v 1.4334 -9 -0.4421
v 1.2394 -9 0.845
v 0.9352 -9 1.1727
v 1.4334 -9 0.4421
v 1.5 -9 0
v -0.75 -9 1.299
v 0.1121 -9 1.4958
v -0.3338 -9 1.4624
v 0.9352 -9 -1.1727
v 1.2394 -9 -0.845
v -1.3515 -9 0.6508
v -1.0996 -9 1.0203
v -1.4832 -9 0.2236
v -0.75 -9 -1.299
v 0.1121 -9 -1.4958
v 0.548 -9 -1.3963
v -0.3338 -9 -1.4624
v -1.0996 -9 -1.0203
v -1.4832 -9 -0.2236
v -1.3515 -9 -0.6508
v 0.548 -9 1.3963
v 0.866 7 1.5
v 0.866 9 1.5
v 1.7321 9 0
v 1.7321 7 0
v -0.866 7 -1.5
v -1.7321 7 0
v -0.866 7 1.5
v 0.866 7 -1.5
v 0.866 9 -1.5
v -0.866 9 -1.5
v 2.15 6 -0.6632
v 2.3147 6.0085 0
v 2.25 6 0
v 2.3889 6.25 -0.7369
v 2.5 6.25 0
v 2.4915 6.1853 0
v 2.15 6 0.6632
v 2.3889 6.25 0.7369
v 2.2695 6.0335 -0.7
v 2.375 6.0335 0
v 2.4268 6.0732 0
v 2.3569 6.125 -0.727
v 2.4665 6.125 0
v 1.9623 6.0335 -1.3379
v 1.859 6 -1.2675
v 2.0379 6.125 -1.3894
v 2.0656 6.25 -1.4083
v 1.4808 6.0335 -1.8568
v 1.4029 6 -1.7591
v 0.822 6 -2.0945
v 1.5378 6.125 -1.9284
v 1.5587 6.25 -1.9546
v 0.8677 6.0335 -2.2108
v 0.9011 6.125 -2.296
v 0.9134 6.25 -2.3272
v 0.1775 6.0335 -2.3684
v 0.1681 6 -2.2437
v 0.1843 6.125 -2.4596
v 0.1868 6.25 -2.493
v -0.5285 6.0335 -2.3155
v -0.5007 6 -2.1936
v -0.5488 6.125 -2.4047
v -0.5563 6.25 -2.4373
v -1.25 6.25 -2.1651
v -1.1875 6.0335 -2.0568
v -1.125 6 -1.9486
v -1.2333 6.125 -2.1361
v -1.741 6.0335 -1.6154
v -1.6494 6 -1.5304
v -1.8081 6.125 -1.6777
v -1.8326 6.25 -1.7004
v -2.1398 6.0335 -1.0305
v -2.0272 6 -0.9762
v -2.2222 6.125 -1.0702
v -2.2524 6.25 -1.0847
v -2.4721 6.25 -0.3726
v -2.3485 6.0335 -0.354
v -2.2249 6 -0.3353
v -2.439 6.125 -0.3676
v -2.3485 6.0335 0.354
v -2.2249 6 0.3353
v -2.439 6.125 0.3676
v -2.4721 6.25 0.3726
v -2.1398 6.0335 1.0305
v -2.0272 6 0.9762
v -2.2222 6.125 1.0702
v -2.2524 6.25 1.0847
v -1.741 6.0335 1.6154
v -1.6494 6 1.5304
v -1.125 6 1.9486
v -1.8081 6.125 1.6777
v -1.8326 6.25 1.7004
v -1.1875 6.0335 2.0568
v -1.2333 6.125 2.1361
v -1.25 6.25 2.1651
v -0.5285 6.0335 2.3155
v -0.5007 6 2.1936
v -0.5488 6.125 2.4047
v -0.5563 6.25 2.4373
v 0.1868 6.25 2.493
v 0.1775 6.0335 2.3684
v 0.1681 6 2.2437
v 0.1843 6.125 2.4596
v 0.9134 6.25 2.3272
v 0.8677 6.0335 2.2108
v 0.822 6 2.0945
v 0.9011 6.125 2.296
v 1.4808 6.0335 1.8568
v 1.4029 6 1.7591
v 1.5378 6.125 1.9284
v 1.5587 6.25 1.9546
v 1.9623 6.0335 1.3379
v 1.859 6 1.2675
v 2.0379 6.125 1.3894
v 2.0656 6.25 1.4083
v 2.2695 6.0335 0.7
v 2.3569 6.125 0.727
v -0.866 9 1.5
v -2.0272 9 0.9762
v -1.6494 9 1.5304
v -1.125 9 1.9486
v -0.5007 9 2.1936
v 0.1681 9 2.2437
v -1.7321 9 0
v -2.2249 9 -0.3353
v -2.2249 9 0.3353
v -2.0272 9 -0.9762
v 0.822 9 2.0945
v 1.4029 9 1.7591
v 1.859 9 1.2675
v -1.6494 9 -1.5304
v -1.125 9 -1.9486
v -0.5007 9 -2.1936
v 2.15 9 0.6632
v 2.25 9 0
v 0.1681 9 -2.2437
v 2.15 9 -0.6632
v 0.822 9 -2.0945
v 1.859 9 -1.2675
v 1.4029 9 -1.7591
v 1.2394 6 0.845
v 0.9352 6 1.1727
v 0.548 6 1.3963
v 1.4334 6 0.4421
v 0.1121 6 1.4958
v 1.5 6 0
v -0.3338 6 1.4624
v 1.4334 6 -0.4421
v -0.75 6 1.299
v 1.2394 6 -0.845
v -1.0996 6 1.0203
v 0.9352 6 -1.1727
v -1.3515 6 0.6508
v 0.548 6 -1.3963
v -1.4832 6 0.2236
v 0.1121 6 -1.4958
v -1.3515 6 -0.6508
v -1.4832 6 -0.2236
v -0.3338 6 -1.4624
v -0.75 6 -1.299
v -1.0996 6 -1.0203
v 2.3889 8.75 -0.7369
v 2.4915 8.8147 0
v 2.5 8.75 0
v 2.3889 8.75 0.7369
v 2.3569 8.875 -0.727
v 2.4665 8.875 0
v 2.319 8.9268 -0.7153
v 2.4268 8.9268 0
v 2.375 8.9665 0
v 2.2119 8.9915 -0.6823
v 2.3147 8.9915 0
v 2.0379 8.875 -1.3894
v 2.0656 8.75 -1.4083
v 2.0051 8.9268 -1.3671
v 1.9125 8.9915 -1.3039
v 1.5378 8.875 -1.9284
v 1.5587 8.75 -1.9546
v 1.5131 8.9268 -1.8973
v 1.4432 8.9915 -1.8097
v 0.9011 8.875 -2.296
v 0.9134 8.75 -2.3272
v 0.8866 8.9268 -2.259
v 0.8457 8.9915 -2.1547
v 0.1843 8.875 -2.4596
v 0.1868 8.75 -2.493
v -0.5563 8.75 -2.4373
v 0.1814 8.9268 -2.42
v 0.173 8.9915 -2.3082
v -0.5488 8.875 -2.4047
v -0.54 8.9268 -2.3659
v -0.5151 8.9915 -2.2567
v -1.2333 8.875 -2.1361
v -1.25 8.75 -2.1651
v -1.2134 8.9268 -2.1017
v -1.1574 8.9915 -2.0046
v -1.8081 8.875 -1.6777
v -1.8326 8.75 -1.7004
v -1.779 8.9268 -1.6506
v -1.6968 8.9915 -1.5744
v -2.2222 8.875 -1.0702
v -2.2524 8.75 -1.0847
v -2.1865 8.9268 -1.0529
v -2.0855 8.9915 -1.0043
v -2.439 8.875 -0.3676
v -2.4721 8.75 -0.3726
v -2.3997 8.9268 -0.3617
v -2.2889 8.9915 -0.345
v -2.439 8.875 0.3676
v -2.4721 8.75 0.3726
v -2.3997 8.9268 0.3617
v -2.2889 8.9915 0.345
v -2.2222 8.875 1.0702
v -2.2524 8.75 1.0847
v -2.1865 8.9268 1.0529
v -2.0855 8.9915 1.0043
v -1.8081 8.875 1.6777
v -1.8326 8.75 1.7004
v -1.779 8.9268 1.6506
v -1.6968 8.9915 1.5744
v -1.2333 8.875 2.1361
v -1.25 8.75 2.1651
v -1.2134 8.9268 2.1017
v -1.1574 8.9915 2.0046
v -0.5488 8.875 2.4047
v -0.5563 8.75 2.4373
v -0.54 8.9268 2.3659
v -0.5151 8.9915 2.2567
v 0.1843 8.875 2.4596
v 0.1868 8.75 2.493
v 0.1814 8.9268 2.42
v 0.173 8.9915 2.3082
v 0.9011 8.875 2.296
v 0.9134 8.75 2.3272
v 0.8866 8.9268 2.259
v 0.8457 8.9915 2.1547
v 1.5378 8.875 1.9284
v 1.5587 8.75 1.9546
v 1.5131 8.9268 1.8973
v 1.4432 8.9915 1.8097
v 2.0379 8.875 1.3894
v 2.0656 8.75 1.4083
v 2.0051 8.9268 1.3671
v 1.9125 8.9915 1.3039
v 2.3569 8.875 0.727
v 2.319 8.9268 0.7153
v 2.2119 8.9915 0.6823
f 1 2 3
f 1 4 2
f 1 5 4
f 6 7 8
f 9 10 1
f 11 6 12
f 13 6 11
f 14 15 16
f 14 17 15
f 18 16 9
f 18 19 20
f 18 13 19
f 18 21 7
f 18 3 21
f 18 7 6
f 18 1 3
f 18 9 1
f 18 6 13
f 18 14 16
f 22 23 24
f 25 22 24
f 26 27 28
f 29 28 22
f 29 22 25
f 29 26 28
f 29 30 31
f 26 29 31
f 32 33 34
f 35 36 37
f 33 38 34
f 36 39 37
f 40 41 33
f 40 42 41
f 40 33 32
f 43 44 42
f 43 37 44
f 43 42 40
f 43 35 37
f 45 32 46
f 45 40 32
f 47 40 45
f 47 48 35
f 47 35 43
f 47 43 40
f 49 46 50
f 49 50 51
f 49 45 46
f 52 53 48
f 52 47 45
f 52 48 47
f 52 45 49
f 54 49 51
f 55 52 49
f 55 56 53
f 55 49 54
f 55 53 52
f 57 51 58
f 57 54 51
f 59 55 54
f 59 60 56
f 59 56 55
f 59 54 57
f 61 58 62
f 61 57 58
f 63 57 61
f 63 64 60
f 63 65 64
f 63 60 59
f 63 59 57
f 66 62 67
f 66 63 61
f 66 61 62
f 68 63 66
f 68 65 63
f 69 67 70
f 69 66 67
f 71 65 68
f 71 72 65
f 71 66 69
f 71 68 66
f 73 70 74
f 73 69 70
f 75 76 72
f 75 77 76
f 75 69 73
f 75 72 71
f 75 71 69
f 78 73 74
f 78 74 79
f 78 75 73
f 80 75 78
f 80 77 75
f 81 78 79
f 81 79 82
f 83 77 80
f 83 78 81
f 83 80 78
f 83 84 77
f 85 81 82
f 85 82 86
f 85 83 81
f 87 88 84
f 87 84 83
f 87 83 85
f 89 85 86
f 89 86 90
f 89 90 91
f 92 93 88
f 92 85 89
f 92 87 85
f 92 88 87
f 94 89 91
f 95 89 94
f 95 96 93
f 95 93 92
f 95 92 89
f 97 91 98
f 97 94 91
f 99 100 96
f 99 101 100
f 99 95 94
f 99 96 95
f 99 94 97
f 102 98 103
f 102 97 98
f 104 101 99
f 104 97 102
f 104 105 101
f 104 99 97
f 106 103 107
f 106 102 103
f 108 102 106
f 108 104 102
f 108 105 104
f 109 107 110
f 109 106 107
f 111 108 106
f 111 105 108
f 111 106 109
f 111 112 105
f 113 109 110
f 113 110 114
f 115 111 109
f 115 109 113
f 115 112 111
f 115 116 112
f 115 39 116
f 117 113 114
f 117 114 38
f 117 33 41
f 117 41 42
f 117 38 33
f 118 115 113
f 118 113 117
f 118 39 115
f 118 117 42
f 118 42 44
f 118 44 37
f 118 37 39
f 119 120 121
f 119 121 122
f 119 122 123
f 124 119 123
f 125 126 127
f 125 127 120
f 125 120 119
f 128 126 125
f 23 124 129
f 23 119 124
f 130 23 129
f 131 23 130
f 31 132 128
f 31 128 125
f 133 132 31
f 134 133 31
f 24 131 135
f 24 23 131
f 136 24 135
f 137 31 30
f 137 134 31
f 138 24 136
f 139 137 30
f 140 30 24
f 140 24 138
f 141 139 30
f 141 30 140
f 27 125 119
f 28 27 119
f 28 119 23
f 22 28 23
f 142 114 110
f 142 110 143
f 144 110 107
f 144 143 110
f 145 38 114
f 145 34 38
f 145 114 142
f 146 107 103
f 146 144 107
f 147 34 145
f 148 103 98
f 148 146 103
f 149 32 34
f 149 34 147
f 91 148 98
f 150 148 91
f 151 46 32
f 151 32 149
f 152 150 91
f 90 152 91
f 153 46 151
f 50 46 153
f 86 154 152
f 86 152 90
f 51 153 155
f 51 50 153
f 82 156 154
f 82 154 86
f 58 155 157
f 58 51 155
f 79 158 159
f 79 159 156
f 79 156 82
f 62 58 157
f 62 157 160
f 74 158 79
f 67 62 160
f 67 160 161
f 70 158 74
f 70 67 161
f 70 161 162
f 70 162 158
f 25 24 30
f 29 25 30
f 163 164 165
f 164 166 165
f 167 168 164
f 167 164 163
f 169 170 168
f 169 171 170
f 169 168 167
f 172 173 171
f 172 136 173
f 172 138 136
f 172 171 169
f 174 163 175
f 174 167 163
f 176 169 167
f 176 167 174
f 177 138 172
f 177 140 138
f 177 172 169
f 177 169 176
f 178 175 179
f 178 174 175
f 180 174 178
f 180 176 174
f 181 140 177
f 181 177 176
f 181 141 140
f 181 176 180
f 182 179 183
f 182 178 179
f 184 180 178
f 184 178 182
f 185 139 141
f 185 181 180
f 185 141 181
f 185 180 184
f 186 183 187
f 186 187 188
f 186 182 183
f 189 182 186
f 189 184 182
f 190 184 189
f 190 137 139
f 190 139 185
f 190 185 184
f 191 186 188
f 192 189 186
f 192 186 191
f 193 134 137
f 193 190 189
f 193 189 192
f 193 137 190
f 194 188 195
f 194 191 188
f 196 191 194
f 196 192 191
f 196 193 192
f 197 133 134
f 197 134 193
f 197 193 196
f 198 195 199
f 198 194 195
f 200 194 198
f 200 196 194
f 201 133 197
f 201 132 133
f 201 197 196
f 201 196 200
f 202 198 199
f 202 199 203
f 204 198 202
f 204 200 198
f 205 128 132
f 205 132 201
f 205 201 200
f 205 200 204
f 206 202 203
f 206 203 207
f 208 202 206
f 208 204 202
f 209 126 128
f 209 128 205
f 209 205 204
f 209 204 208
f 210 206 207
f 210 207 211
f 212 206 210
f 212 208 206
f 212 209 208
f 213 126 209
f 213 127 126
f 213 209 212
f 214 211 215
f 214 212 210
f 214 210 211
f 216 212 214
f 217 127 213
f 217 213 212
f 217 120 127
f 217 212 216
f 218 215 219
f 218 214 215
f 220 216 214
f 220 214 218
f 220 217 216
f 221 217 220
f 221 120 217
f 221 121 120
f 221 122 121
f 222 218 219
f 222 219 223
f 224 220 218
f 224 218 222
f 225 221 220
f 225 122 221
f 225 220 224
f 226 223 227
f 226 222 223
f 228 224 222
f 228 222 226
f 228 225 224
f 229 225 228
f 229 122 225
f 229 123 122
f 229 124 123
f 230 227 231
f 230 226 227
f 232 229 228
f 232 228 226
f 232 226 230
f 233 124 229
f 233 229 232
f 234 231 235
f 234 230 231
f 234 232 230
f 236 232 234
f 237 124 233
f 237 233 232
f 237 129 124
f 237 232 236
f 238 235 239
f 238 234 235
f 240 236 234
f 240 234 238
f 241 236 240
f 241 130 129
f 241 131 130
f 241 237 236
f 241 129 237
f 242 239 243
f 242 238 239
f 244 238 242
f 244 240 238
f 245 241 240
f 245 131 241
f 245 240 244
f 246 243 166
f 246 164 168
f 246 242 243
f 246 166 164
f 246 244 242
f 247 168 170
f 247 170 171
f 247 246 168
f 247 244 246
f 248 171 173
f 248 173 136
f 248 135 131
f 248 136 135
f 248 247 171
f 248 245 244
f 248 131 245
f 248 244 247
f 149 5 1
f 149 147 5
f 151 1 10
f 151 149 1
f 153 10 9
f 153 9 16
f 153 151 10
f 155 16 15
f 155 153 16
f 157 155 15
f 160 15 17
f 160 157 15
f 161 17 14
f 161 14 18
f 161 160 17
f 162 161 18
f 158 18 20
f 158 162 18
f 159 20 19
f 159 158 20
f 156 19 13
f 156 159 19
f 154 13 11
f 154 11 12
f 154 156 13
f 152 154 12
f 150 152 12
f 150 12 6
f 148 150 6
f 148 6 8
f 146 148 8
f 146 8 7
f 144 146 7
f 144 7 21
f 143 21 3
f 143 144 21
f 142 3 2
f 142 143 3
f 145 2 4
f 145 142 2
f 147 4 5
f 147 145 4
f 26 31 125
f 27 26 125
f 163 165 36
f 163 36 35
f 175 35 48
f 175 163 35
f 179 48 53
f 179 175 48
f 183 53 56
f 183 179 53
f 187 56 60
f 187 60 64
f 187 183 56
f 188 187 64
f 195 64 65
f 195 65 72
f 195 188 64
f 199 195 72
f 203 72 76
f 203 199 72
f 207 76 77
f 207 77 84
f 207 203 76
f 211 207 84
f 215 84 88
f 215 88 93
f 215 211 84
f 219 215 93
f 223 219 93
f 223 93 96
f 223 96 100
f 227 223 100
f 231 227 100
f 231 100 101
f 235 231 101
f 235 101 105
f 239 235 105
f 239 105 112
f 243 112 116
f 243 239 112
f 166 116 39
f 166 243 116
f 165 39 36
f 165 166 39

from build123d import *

# Parameters (mm, degrees)
CUT_EXTRUDE1_DEPTH = 2
FILLET1_R          = 0.25


with BuildPart() as part:
    # Sketch1 → Revolve1 (revolve)
    with BuildSketch(Plane.XY):
        Polygon((0, -9), (1.5, -9), (1.5, 6), (2.5, 6), (2.5, 9), (0, 9), align=None)
    revolve(axis=Axis((0, -1000, 0), (0, 1, 0)))

    # Sketch2 → Cut-Extrude1 (cut)
    with BuildSketch(Plane(origin=(0, 9, 0), x_dir=(1, 0, 0), z_dir=(0, 1, 0))):
        Polygon((0.866025404, 1.5), (-0.866025404, 1.5), (-1.732050808, 0), (-0.866025404, -1.5), (0.866025404, -1.5), (1.732050808, 0), align=None)
    extrude(amount=-CUT_EXTRUDE1_DEPTH, mode=Mode.SUBTRACT)

    # Fillet1
    fillet1_edges = [part.edges().sort_by_distance(p)[0] for p in [
        (-2.5, 9, 0),
        (-2.5, 6, 0),
    ]]
    fillet(fillet1_edges, radius=FILLET1_R)


solid = part.part
